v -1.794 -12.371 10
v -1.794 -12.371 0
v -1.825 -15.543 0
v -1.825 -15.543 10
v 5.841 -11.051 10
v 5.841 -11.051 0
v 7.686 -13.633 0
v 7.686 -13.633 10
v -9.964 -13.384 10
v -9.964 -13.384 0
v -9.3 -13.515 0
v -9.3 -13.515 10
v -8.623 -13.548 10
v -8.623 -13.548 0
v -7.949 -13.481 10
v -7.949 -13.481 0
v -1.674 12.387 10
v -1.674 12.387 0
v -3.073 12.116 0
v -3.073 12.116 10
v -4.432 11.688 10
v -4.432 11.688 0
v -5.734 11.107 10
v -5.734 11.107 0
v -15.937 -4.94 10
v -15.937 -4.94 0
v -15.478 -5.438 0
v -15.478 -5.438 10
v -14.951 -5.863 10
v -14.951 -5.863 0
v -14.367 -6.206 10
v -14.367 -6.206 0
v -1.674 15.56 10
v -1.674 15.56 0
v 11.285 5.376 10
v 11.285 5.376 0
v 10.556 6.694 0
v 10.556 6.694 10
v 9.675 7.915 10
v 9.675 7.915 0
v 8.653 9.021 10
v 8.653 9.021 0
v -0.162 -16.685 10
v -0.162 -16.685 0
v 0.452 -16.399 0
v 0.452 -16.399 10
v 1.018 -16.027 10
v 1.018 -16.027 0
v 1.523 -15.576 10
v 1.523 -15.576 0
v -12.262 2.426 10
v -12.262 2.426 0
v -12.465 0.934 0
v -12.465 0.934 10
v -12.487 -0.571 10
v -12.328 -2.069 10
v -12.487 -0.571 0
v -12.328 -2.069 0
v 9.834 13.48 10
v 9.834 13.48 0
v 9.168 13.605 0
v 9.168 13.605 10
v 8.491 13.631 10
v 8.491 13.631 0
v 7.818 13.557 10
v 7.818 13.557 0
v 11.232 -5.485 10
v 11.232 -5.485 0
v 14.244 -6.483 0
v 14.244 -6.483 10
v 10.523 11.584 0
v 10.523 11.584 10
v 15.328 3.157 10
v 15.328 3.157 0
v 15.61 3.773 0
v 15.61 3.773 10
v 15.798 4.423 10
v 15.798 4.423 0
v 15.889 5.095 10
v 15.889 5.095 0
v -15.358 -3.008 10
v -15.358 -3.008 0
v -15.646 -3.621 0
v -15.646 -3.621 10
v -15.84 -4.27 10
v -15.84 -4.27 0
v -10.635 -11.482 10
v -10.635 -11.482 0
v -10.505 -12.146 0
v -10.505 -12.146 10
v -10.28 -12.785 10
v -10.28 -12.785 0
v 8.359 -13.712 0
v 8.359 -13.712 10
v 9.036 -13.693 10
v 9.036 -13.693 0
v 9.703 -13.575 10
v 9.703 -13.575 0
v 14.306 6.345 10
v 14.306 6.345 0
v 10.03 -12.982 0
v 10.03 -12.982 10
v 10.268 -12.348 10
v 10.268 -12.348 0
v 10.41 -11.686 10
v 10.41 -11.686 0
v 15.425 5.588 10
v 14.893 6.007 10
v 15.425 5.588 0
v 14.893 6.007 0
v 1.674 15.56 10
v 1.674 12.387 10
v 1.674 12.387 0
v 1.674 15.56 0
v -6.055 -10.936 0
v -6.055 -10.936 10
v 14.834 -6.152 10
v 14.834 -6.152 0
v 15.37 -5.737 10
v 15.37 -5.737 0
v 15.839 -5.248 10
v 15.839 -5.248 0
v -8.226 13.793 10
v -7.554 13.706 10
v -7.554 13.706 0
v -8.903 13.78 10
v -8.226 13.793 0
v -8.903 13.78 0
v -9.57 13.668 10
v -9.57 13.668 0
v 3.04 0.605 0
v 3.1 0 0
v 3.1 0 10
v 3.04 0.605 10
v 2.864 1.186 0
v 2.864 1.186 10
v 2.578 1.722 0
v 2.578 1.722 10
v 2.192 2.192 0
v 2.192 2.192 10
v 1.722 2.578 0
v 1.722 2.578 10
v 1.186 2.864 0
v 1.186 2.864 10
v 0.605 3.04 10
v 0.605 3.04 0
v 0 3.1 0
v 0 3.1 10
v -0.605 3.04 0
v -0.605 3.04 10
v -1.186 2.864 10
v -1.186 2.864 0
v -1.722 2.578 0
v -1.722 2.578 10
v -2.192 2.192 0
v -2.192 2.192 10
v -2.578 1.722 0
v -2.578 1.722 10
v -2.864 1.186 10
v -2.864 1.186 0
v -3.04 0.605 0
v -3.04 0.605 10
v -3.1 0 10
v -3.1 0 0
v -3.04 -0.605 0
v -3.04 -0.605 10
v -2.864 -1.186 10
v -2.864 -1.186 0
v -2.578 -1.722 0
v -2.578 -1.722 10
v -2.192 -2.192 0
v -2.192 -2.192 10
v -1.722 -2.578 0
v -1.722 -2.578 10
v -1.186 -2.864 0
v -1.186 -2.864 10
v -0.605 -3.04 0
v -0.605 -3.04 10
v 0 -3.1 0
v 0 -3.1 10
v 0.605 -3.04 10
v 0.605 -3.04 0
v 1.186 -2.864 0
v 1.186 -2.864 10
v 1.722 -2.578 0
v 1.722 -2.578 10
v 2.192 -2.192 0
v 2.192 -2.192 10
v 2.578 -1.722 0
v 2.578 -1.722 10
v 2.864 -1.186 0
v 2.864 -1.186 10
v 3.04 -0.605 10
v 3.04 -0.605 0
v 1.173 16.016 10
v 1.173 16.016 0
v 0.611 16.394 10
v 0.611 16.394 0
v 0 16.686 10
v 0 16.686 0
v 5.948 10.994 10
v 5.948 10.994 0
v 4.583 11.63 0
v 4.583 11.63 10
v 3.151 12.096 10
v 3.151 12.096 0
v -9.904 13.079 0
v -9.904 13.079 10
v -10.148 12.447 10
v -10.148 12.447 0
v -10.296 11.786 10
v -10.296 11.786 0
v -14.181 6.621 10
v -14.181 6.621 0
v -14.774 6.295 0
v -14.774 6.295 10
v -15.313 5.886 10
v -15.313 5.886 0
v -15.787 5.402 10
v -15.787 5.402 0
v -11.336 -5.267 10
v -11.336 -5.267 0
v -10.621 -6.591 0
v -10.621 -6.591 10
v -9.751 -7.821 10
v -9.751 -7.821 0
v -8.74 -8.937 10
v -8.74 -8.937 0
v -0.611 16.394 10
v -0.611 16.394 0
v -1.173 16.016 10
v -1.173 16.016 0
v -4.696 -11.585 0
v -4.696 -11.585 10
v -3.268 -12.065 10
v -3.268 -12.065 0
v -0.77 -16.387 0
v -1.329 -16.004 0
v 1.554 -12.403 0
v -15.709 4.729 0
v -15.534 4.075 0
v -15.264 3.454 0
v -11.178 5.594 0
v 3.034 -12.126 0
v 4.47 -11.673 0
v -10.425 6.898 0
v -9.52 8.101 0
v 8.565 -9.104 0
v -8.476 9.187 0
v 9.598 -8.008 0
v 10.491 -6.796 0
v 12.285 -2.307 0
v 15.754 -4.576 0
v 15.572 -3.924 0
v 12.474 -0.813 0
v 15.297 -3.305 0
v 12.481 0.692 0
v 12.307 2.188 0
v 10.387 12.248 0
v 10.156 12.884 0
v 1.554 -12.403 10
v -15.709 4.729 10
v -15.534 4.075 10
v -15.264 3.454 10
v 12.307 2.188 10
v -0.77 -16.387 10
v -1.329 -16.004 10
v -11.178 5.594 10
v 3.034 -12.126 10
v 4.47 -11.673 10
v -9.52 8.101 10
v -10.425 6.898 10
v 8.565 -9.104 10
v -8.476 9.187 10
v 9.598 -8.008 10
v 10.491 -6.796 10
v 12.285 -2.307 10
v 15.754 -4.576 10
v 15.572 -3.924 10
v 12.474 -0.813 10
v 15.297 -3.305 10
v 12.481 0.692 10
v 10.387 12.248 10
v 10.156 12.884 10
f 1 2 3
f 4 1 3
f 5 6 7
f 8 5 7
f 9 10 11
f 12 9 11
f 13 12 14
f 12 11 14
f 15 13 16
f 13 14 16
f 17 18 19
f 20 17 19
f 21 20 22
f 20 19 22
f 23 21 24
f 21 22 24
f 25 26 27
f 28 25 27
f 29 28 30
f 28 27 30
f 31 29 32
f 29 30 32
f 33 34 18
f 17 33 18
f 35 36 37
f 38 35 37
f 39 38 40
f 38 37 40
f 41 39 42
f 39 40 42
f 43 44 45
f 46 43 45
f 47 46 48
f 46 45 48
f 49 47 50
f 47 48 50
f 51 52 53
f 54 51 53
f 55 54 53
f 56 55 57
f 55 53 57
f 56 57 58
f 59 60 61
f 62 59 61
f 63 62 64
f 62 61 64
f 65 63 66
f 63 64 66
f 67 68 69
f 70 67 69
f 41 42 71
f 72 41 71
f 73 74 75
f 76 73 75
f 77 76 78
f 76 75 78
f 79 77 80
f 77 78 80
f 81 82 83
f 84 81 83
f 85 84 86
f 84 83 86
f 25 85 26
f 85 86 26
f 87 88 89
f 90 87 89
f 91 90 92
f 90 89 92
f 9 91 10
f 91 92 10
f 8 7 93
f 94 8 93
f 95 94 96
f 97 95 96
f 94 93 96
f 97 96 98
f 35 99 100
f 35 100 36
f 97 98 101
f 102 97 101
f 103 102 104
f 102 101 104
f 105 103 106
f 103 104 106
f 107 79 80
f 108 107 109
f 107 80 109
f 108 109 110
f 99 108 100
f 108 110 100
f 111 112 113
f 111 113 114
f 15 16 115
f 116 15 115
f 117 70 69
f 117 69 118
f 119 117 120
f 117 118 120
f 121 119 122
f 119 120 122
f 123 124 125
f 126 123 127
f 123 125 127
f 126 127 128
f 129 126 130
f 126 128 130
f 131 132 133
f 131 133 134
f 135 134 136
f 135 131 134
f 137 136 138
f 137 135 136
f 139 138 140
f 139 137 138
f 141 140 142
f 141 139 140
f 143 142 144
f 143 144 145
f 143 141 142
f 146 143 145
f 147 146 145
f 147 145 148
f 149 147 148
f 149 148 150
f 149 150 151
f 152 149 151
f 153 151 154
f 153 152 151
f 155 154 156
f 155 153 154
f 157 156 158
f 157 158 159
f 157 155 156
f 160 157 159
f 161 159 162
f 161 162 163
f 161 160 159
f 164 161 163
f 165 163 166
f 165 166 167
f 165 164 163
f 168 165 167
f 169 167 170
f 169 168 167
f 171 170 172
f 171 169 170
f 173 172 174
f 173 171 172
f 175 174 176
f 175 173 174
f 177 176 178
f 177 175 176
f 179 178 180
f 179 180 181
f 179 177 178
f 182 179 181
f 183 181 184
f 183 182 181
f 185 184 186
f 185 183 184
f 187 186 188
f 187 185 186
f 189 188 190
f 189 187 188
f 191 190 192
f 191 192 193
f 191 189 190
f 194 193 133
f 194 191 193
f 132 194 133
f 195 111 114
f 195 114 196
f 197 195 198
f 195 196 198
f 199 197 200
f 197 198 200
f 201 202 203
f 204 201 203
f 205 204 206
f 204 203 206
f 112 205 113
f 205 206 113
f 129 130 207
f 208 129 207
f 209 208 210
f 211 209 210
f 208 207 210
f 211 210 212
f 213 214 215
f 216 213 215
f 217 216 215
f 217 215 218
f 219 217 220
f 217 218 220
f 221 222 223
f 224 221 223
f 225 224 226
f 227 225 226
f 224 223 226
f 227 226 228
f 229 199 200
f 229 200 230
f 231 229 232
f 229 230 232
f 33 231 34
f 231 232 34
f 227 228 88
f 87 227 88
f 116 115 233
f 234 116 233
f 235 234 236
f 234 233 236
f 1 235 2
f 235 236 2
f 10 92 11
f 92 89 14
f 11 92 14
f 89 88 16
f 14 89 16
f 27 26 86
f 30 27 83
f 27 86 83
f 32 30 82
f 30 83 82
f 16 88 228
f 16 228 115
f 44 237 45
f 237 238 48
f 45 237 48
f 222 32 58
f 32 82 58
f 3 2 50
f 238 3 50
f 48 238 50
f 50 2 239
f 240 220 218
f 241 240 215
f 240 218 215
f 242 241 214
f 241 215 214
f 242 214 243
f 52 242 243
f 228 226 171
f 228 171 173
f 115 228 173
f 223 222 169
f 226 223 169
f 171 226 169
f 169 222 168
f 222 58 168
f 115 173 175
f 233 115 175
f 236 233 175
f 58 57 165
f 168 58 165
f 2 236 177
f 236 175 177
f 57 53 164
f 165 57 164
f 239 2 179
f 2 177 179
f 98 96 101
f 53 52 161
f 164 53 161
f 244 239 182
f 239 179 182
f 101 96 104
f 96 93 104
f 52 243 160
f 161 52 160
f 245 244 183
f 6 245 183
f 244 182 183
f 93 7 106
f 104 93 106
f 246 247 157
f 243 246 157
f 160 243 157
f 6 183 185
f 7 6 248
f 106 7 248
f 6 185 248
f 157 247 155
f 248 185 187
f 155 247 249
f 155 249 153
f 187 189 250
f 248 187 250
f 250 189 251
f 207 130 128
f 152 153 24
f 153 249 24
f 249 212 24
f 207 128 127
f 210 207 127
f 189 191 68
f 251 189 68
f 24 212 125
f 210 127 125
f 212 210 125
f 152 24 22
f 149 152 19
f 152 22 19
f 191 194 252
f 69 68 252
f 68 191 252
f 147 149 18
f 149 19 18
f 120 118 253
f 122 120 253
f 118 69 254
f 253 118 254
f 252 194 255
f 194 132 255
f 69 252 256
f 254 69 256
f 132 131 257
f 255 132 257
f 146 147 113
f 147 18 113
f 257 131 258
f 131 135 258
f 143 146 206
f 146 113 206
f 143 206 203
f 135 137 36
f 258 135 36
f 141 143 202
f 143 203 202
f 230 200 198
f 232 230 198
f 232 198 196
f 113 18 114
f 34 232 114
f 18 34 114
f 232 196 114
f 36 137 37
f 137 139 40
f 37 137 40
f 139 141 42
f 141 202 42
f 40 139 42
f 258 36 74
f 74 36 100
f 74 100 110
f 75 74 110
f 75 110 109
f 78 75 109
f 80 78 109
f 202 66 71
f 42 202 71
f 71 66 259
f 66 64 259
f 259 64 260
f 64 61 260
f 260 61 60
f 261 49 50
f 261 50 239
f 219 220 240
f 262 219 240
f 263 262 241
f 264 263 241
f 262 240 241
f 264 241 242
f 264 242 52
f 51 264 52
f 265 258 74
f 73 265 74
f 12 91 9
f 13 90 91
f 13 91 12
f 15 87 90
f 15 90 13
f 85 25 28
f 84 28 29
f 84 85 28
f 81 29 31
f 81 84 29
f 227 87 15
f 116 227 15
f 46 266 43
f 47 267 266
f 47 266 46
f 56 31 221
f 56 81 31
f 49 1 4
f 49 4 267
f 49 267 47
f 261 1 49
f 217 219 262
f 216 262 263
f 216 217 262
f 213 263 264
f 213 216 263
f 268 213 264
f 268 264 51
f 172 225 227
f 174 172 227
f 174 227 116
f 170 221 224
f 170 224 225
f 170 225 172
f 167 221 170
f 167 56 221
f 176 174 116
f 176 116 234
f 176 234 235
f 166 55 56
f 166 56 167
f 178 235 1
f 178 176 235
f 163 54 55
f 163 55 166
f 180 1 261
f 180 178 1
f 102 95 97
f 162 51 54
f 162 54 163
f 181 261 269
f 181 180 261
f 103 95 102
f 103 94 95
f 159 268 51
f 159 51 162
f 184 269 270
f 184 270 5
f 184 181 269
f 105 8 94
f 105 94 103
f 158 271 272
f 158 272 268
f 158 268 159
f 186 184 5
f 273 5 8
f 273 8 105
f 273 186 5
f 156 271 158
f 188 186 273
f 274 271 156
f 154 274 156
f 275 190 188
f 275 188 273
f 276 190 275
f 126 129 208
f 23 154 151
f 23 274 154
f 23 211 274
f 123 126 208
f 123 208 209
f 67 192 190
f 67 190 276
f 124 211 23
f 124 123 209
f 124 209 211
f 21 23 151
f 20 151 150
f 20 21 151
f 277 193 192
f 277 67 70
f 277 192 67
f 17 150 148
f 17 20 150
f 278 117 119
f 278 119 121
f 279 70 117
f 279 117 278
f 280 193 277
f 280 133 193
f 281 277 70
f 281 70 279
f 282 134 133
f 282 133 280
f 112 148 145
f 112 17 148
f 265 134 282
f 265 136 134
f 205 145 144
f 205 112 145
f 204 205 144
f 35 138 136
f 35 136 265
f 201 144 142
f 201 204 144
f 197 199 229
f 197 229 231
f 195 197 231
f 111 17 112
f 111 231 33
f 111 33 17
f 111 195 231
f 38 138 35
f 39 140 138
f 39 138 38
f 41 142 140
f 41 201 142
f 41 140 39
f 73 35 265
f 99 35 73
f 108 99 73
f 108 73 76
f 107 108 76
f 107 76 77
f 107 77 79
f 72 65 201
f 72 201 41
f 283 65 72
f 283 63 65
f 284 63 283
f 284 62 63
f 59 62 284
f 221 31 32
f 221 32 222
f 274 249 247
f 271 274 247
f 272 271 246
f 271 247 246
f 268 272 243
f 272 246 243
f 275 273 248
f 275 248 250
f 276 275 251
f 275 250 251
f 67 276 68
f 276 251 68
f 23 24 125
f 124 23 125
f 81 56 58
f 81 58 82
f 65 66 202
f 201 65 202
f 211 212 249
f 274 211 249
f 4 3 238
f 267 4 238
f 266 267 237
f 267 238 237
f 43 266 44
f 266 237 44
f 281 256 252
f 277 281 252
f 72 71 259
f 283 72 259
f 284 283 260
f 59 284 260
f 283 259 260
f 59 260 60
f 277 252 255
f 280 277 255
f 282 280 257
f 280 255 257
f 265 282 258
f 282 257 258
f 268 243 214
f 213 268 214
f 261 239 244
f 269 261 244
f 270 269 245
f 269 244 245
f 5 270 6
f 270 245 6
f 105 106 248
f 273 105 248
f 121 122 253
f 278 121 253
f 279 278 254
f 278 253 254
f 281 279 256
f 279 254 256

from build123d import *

# Parameters (mm, degrees)
F0_R     = 3.1
F1_DEPTH = 10


with BuildPart() as f1:
    # F0 (on Top) → F1 (new body)
    with BuildSketch(Plane.XY):
        with BuildLine():
            ThreePointArc((1.673929859, 12.3874113045), (0, 12.5), (-1.673929859, 12.3874113045))
            ThreePointArc((-1.673929859, 12.3874113045), (-3.7588224938, 11.9214618844), (-5.7339241657, 11.1073000167))
            ThreePointArc((-5.7339241657, 11.1073000167), (-7.1697054544, 10.2394005536), (-8.4763302976, 9.1870465703))
            ThreePointArc((-8.4763302976, 9.1870465703), (-9.9902333855, 7.5130045191), (-11.1784184623, 5.5940111443))
            ThreePointArc((-11.1784184623, 5.5940111443), (-11.8268519609, 4.0466742757), (-12.2622342862, 2.4264398427))
            ThreePointArc((-12.2622342862, 2.4264398427), (-12.4986778991, 0.1817987206), (-12.3276190694, -2.0687697022))
            ThreePointArc((-12.3276190694, -2.0687697022), (-11.9395449954, -3.7009816676), (-11.336389674, -5.2665234414))
            ThreePointArc((-11.336389674, -5.2665234414), (-10.2045206414, -7.2192630149), (-8.7399470524, -8.9366283084))
            ThreePointArc((-8.7399470524, -8.9366283084), (-7.4644823963, -10.0265399094), (-6.0545511265, -10.9358315027))
            ThreePointArc((-6.0545511265, -10.9358315027), (-3.9892887467, -11.8463317232), (-1.7939610174, -12.3705983634))
            ThreePointArc((-1.7939610174, -12.3705983634), (-0.1212015211, -12.4994123938), (1.5537413227, -12.4030596186))
            ThreePointArc((1.5537413227, -12.4030596186), (3.7588224938, -11.9214618844), (5.8413523551, -11.0511810529))
            ThreePointArc((5.8413523551, -11.0511810529), (7.2686508911, -10.1694008783), (8.5650105596, -9.1044271711))
            ThreePointArc((8.5650105596, -9.1044271711), (10.0626107657, -7.4157848255), (11.2321331944, -5.4853608726))
            ThreePointArc((11.2321331944, -5.4853608726), (11.8655330447, -3.9318094519), (12.285184913, -2.3074296637))
            ThreePointArc((12.285184913, -2.3074296637), (12.4998530976, -0.0606014727), (12.3069805238, 2.188202547))
            ThreePointArc((12.3069805238, 2.188202547), (11.9030985667, 3.8165749712), (11.2847919153, 5.3761948838))
            ThreePointArc((11.2847919153, 5.3761948838), (10.1340420896, 7.3178679221), (8.6528855651, 9.0209518011))
            ThreePointArc((8.6528855651, 9.0209518011), (7.3669129512, 10.0984451065), (5.9482313582, 10.9940230903))
            ThreePointArc((5.9482313582, 10.9940230903), (3.8742377423, 11.8844554741), (1.673929859, 12.3874113045))
        make_face()
        Circle(F0_R, mode=Mode.SUBTRACT)
        with BuildLine():
            ThreePointArc((-12.2622342862, 2.4264398427), (-11.8268519609, 4.0466742757), (-11.1784184623, 5.5940111443))
            Line((-11.1784184623, 5.5940111443), (-14.1805287895, 6.6212128607))
            ThreePointArc((-14.1805287895, 6.6212128607), (-15.0512360756, 6.1003265438), (-15.786995451, 5.4016765064))
            ThreePointArc((-15.786995451, 5.4016765064), (-15.6334500279, 4.3987420438), (-15.2643446134, 3.4536415591))
            Line((-15.2643446134, 3.4536415591), (-12.2622342862, 2.4264398427))
        make_face()
        with BuildLine():
            ThreePointArc((-11.336389674, -5.2665234414), (-11.9395449954, -3.7009816676), (-12.3276190694, -2.0687697022))
            Line((-12.3276190694, -2.0687697022), (-15.3583352271, -3.0082213265))
            ThreePointArc((-15.3583352271, -3.0082213265), (-15.7547724734, -3.9421866593), (-15.9374230058, -4.9402310051))
            ThreePointArc((-15.9374230058, -4.9402310051), (-15.2222949332, -5.6599848332), (-14.3671058317, -6.2059750657))
            Line((-14.3671058317, -6.2059750657), (-11.336389674, -5.2665234414))
        make_face()
        with BuildLine():
            ThreePointArc((-6.0545511265, -10.9358315027), (-7.4644823963, -10.0265399094), (-8.7399470524, -8.9366283084))
            Line((-8.7399470524, -8.9366283084), (-10.6347200455, -11.4817501301))
            ThreePointArc((-10.6347200455, -11.4817501301), (-10.4045567225, -12.4699194364), (-9.9639151672, -13.3838607655))
            ThreePointArc((-9.9639151672, -13.3838607655), (-8.9619915366, -13.5438694265), (-7.9493241196, -13.4809533245))
            Line((-7.9493241196, -13.4809533245), (-6.0545511265, -10.9358315027))
        make_face()
        with BuildLine():
            ThreePointArc((1.5537413227, -12.4030596186), (-0.1212015211, -12.4994123938), (-1.7939610174, -12.3705983634))
            Line((-1.7939610174, -12.3705983634), (-1.8247266294, -15.5434304201))
            ThreePointArc((-1.8247266294, -15.5434304201), (-1.0564027139, -16.2061008466), (-0.1617850522, -16.6847583155))
            ThreePointArc((-0.1617850522, -16.6847583155), (0.7419462008, -16.2235386762), (1.5229757107, -15.5758916753))
            Line((1.5229757107, -15.5758916753), (1.5537413227, -12.4030596186))
        make_face()
        with BuildLine():
            Line((10.4100739777, -11.6858126065), (8.5650105596, -9.1044271711))
            ThreePointArc((8.5650105596, -9.1044271711), (7.2686508911, -10.1694008783), (5.8413523551, -11.0511810529))
            Line((5.8413523551, -11.0511810529), (7.6864157733, -13.6325664882))
            ThreePointArc((7.6864157733, -13.6325664882), (8.6976727518, -13.71510773), (9.7025107722, -13.5745577889))
            ThreePointArc((9.7025107722, -13.5745577889), (10.1607920135, -12.6693329344), (10.4100739777, -11.6858126065))
        make_face()
        with BuildLine():
            Line((15.2971139884, -3.3054742658), (12.285184913, -2.3074296637))
            ThreePointArc((12.285184913, -2.3074296637), (11.8655330447, -3.9318094519), (11.2321331944, -5.4853608726))
            Line((11.2321331944, -5.4853608726), (14.2440622698, -6.4834054748))
            ThreePointArc((14.2440622698, -6.4834054748), (15.1096780482, -5.9541011602), (15.8386286408, -5.2483499528))
            ThreePointArc((15.8386286408, -5.2483499528), (15.6753658611, -4.2469514318), (15.2971139884, -3.3054742658))
        make_face()
        with BuildLine():
            Line((14.3062565663, 6.3449885386), (11.2847919153, 5.3761948838))
            ThreePointArc((11.2847919153, 5.3761948838), (11.9030985667, 3.8165749712), (12.3069805238, 2.188202547))
            Line((12.3069805238, 2.188202547), (15.3284451748, 3.1569962018))
            ThreePointArc((15.3284451748, 3.1569962018), (15.7158079437, 4.0947615341), (15.8887727305, 5.0945299651))
            ThreePointArc((15.8887727305, 5.0945299651), (15.1666994543, 5.8073159898), (14.3062565663, 6.3449885386))
        make_face()
        with BuildLine():
            Line((7.81823747, 13.5573972192), (5.9482313582, 10.9940230903))
            ThreePointArc((5.9482313582, 10.9940230903), (7.3669129512, 10.0984451065), (8.6528855651, 9.0209518011))
            Line((8.6528855651, 9.0209518011), (10.5228916769, 11.58432593))
            ThreePointArc((10.5228916769, 11.58432593), (10.2831577637, 12.5702170924), (9.833675236, 13.4798429443))
            ThreePointArc((9.833675236, 13.4798429443), (8.8302472408, 13.6301293101), (7.81823747, 13.5573972192))
        make_face()
        with BuildLine():
            Line((-1.673929859, 15.5603925183), (-1.673929859, 12.3874113045))
            ThreePointArc((-1.673929859, 12.3874113045), (0, 12.5), (1.673929859, 12.3874113045))
            Line((1.673929859, 12.3874113045), (1.673929859, 15.5603925183))
            ThreePointArc((1.673929859, 15.5603925183), (0.8992167282, 16.2155820315), (0, 16.6855426777))
            ThreePointArc((0, 16.6855426777), (-0.8992167282, 16.2155820315), (-1.673929859, 15.5603925183))
        make_face()
        with BuildLine():
            ThreePointArc((-8.4763302976, 9.1870465703), (-7.1697054544, 10.2394005536), (-5.7339241657, 11.1073000167))
            Line((-5.7339241657, 11.1073000167), (-7.5538714229, 13.7064540645))
            ThreePointArc((-7.5538714229, 13.7064540645), (-8.5642805338, 13.7987966969), (-9.5704341076, 13.6679963945))
            ThreePointArc((-9.5704341076, 13.6679963945), (-10.0374709761, 12.767257644), (-10.2962775548, 11.7862006181))
            Line((-10.2962775548, 11.7862006181), (-8.4763302976, 9.1870465703))
        make_face()
    extrude(amount=F1_DEPTH)


solid = f1.part
